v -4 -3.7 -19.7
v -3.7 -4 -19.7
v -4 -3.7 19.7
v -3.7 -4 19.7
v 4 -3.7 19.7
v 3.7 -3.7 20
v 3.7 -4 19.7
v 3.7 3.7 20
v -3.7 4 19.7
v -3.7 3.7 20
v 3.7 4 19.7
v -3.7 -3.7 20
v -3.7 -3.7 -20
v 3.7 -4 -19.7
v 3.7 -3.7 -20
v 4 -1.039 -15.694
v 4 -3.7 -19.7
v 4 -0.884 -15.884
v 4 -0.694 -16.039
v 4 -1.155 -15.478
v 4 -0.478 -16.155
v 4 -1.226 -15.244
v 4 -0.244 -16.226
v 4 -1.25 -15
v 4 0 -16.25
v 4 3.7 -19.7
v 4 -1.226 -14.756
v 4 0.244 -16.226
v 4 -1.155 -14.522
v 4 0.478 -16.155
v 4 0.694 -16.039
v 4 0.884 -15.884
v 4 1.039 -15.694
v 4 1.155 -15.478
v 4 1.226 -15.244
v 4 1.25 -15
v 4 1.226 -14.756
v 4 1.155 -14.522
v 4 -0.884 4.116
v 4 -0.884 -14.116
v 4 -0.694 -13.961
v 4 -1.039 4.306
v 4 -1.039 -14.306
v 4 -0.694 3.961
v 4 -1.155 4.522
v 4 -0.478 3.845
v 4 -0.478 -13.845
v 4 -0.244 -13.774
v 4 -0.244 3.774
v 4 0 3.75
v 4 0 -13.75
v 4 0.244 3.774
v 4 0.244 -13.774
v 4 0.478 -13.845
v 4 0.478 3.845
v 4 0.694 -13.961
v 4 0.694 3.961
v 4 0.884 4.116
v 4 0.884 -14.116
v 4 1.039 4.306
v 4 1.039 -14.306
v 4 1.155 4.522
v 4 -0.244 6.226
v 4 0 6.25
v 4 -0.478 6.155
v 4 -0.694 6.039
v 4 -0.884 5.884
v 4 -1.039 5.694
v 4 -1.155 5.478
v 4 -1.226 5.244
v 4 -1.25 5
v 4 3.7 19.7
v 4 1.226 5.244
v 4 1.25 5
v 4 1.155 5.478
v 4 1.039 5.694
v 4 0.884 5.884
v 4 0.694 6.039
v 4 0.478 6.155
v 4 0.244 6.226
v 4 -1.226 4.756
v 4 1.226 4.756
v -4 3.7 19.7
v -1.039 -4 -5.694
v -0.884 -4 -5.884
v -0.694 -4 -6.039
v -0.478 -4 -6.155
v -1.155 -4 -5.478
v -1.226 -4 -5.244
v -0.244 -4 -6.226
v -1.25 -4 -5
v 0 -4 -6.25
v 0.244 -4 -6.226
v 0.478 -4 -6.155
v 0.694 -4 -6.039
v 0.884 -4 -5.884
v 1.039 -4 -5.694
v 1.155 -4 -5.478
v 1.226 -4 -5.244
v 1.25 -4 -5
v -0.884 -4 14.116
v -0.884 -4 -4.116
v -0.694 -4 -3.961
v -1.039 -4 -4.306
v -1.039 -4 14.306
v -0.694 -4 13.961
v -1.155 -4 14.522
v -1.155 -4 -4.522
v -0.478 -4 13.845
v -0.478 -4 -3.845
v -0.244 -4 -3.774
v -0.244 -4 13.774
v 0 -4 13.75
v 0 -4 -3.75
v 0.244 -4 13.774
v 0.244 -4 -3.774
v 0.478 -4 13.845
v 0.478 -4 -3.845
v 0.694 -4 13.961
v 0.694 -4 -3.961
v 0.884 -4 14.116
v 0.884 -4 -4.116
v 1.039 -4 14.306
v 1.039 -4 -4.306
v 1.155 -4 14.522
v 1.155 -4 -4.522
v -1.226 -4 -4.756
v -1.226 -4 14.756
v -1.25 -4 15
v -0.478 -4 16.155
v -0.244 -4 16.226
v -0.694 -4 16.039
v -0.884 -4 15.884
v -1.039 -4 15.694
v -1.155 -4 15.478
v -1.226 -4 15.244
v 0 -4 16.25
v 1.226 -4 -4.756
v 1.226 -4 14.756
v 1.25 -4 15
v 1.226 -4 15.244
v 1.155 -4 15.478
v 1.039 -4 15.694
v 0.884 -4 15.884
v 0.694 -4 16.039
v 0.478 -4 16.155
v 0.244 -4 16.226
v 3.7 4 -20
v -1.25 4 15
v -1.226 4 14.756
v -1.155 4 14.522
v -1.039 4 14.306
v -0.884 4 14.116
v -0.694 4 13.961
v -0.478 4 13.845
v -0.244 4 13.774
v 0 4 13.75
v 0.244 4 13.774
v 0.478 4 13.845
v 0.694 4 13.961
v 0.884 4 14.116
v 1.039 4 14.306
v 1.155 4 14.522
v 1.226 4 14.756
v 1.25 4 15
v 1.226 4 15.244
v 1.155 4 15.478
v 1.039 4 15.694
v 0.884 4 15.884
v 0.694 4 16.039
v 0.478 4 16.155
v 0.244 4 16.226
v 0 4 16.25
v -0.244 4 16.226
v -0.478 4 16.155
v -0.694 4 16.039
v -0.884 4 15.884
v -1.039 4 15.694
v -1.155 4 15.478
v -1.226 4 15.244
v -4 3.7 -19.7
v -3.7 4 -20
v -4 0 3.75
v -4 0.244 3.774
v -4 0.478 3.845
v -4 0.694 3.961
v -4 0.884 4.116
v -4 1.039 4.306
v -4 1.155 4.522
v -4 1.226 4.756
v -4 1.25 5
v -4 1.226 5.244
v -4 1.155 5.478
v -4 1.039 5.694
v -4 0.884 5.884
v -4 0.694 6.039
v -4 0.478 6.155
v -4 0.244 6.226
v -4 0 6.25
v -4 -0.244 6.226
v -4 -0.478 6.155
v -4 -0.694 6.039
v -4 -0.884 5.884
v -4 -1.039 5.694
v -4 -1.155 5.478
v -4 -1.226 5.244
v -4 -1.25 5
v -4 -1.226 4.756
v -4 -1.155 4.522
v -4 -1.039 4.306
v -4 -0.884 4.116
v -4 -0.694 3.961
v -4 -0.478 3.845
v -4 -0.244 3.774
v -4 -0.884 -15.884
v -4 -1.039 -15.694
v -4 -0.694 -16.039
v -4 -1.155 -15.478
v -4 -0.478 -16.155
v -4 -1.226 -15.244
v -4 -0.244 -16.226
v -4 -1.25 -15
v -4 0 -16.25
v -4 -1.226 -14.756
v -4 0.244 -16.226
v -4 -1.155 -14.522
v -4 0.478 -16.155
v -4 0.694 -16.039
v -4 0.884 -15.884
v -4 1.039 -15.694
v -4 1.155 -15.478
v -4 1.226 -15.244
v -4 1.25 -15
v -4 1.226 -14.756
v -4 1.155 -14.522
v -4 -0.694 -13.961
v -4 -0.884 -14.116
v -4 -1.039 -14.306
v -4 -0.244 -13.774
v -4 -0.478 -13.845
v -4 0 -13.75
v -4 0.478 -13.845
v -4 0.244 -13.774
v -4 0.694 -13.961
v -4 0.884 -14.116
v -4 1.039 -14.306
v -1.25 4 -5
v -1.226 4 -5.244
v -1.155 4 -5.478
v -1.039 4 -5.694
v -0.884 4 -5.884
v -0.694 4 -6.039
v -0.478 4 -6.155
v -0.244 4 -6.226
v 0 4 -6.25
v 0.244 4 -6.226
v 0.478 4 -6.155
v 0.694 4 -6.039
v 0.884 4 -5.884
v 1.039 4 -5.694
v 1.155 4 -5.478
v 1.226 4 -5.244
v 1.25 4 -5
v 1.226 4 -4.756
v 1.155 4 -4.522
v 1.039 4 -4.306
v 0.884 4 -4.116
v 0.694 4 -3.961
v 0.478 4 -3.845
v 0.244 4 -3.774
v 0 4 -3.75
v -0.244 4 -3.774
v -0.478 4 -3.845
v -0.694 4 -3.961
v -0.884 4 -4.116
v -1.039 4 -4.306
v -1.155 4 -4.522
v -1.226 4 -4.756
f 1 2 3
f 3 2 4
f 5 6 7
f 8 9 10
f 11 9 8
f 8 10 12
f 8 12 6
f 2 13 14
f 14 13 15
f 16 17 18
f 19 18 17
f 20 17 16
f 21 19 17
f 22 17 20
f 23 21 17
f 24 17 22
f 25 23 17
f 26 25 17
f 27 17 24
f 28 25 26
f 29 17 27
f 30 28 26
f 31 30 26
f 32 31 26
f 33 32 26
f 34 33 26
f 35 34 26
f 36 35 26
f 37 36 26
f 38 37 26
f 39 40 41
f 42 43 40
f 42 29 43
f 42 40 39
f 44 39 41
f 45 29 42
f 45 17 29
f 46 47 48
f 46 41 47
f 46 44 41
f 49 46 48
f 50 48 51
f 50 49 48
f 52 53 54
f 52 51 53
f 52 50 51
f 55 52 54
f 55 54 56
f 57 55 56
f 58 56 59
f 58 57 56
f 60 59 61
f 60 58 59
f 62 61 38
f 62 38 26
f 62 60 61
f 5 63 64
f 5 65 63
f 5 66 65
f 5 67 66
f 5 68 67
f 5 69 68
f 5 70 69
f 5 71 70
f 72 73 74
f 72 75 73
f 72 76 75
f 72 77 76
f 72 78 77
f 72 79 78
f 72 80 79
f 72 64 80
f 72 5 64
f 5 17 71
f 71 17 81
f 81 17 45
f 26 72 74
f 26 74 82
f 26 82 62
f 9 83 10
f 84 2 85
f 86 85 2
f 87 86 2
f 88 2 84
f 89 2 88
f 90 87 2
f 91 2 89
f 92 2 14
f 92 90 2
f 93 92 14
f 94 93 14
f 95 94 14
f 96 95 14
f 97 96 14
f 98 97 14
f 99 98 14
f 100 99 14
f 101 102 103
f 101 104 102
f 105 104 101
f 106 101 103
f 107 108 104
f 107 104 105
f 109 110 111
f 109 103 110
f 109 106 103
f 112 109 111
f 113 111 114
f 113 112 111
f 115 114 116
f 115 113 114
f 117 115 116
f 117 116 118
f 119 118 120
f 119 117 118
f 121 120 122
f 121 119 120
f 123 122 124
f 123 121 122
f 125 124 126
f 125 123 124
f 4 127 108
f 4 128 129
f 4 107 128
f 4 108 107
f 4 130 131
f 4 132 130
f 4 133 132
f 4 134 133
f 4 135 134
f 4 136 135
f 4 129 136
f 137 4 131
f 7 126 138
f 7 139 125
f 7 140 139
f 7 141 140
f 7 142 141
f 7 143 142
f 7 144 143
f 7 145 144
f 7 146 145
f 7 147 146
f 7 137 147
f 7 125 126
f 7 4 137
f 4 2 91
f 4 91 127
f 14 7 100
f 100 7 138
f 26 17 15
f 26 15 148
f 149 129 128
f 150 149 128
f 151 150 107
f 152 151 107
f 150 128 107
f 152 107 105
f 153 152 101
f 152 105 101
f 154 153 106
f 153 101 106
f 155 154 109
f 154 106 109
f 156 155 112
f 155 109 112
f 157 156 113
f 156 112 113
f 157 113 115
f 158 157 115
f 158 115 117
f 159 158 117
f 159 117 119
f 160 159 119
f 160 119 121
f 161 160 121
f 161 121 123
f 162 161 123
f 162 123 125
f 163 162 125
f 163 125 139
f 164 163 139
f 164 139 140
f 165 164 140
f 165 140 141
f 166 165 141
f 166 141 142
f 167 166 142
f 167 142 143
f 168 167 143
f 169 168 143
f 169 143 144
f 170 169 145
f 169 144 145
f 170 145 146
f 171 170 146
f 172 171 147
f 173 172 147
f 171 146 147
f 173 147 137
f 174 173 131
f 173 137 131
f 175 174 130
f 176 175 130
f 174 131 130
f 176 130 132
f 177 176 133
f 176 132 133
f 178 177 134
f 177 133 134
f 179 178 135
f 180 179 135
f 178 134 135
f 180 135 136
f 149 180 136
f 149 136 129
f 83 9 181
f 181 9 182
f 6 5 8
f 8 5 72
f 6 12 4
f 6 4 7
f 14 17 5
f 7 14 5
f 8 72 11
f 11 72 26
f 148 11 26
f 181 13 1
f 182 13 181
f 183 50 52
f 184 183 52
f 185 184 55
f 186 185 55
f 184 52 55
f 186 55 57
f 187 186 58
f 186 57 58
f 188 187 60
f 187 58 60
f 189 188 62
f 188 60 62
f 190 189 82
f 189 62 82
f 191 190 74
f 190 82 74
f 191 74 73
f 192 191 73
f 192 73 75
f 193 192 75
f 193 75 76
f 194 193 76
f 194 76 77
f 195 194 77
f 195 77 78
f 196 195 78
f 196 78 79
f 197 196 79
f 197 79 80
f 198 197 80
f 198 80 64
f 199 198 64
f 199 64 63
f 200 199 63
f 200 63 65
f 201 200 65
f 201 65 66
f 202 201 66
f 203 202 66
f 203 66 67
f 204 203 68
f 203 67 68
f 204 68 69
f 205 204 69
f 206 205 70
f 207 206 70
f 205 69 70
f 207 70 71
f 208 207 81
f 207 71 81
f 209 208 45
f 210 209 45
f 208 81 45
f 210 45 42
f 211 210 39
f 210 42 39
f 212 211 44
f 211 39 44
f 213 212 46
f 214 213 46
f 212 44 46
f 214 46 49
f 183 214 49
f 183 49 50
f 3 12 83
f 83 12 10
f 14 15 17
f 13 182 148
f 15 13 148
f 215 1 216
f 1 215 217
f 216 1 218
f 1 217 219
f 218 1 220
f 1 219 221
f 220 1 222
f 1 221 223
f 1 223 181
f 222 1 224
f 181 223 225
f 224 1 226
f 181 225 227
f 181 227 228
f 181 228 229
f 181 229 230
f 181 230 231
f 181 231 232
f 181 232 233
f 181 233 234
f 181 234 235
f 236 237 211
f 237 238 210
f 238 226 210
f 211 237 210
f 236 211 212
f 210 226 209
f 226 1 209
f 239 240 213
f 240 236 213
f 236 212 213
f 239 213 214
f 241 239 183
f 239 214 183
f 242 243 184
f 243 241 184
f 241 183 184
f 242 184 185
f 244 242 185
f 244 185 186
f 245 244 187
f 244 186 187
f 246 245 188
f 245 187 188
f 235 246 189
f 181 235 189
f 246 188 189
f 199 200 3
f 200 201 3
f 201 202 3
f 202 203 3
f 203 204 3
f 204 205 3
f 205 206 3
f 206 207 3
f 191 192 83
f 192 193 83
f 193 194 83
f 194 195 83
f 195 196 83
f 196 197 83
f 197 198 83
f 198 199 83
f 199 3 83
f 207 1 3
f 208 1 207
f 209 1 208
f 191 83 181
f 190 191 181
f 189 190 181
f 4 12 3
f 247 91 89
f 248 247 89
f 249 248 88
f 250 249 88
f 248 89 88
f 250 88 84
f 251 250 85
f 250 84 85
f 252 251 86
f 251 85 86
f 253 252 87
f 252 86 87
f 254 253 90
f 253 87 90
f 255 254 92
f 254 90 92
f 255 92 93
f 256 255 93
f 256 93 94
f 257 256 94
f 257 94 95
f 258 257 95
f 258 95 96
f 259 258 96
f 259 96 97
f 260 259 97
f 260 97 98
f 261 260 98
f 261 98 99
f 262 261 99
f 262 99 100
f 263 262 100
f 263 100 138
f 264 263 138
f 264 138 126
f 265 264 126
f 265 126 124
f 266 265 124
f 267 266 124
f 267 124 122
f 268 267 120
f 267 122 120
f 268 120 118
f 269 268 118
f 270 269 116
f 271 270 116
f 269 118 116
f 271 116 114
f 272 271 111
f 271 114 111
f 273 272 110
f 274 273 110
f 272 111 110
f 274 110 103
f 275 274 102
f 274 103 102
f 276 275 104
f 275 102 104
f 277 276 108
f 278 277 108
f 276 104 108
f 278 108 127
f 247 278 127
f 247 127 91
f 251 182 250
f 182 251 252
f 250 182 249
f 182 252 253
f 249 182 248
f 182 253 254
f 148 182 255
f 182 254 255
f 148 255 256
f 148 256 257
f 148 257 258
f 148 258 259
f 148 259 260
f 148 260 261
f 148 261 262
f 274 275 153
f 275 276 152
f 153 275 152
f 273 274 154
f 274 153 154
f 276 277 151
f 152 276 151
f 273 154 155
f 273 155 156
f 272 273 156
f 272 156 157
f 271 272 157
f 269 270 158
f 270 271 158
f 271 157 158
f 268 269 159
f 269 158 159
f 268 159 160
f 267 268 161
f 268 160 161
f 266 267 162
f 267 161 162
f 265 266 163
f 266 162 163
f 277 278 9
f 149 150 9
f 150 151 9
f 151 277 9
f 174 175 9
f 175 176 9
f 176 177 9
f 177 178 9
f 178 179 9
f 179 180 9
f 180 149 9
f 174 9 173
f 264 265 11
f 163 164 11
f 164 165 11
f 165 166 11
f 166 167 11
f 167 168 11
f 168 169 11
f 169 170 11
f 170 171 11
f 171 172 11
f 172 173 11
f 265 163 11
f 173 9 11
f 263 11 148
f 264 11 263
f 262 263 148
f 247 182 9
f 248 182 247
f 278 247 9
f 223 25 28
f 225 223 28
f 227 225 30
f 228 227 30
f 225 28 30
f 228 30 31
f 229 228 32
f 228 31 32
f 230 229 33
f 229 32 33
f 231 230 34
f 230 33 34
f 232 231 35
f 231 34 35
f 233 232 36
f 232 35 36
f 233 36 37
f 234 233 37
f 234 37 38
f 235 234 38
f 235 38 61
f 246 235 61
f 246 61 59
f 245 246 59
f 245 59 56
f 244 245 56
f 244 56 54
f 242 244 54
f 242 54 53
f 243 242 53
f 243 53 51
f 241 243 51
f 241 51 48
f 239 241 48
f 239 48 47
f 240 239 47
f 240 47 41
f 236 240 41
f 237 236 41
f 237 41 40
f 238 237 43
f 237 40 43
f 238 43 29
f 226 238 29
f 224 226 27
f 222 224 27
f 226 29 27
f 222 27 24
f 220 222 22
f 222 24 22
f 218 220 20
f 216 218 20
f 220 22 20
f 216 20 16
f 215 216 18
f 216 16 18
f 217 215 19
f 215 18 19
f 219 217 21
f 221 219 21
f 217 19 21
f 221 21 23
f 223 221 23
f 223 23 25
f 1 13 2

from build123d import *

# Parameters (mm, degrees)
SKETCH_1_W      = 8
SKETCH_1_H      = 8
EXTRUDE_1_DEPTH = 20
HOLE_WIZARD_1_D = 2.5
HOLE_WIZARD_2_D = 2.5
CHAMFER_1_SIZE  = 0.3


with BuildPart() as part:
    # 草图1 → 凸台-拉伸1 (new, symmetric)
    with BuildSketch(Plane.XY):
        Rectangle(SKETCH_1_W, SKETCH_1_H)
    extrude(amount=EXTRUDE_1_DEPTH, both=True)

    # Hole Wizard 1 (through all)
    with Locations(Plane.ZY.offset(4)):
        with Locations((-15, 0), (5, 0)):
            Hole(HOLE_WIZARD_1_D / 2)

    # Hole Wizard 2 (through all)
    with Locations(Plane(origin=(0, 4, 0), x_dir=(1, 0, 0), z_dir=(0, 1, 0))):
        with Locations((0, 5), (0, -15)):
            Hole(HOLE_WIZARD_2_D / 2)

    # 倒角1
    chamfer_1_edges = [part.edges().sort_by_distance(p)[0] for p in [
        (-4, 0, 20),
        (0, -4, 20),
        (4, 0, 20),
        (0, -4, -20),
        (-4, 0, -20),
        (4, 0, -20),
        (4, -4, 0),
        (-4, -4, 0),
        (-4, 4, 0),
        (4, 4, 0),
        (0, 4, 20),
    ]]
    chamfer(chamfer_1_edges, length=CHAMFER_1_SIZE)


solid = part.part
